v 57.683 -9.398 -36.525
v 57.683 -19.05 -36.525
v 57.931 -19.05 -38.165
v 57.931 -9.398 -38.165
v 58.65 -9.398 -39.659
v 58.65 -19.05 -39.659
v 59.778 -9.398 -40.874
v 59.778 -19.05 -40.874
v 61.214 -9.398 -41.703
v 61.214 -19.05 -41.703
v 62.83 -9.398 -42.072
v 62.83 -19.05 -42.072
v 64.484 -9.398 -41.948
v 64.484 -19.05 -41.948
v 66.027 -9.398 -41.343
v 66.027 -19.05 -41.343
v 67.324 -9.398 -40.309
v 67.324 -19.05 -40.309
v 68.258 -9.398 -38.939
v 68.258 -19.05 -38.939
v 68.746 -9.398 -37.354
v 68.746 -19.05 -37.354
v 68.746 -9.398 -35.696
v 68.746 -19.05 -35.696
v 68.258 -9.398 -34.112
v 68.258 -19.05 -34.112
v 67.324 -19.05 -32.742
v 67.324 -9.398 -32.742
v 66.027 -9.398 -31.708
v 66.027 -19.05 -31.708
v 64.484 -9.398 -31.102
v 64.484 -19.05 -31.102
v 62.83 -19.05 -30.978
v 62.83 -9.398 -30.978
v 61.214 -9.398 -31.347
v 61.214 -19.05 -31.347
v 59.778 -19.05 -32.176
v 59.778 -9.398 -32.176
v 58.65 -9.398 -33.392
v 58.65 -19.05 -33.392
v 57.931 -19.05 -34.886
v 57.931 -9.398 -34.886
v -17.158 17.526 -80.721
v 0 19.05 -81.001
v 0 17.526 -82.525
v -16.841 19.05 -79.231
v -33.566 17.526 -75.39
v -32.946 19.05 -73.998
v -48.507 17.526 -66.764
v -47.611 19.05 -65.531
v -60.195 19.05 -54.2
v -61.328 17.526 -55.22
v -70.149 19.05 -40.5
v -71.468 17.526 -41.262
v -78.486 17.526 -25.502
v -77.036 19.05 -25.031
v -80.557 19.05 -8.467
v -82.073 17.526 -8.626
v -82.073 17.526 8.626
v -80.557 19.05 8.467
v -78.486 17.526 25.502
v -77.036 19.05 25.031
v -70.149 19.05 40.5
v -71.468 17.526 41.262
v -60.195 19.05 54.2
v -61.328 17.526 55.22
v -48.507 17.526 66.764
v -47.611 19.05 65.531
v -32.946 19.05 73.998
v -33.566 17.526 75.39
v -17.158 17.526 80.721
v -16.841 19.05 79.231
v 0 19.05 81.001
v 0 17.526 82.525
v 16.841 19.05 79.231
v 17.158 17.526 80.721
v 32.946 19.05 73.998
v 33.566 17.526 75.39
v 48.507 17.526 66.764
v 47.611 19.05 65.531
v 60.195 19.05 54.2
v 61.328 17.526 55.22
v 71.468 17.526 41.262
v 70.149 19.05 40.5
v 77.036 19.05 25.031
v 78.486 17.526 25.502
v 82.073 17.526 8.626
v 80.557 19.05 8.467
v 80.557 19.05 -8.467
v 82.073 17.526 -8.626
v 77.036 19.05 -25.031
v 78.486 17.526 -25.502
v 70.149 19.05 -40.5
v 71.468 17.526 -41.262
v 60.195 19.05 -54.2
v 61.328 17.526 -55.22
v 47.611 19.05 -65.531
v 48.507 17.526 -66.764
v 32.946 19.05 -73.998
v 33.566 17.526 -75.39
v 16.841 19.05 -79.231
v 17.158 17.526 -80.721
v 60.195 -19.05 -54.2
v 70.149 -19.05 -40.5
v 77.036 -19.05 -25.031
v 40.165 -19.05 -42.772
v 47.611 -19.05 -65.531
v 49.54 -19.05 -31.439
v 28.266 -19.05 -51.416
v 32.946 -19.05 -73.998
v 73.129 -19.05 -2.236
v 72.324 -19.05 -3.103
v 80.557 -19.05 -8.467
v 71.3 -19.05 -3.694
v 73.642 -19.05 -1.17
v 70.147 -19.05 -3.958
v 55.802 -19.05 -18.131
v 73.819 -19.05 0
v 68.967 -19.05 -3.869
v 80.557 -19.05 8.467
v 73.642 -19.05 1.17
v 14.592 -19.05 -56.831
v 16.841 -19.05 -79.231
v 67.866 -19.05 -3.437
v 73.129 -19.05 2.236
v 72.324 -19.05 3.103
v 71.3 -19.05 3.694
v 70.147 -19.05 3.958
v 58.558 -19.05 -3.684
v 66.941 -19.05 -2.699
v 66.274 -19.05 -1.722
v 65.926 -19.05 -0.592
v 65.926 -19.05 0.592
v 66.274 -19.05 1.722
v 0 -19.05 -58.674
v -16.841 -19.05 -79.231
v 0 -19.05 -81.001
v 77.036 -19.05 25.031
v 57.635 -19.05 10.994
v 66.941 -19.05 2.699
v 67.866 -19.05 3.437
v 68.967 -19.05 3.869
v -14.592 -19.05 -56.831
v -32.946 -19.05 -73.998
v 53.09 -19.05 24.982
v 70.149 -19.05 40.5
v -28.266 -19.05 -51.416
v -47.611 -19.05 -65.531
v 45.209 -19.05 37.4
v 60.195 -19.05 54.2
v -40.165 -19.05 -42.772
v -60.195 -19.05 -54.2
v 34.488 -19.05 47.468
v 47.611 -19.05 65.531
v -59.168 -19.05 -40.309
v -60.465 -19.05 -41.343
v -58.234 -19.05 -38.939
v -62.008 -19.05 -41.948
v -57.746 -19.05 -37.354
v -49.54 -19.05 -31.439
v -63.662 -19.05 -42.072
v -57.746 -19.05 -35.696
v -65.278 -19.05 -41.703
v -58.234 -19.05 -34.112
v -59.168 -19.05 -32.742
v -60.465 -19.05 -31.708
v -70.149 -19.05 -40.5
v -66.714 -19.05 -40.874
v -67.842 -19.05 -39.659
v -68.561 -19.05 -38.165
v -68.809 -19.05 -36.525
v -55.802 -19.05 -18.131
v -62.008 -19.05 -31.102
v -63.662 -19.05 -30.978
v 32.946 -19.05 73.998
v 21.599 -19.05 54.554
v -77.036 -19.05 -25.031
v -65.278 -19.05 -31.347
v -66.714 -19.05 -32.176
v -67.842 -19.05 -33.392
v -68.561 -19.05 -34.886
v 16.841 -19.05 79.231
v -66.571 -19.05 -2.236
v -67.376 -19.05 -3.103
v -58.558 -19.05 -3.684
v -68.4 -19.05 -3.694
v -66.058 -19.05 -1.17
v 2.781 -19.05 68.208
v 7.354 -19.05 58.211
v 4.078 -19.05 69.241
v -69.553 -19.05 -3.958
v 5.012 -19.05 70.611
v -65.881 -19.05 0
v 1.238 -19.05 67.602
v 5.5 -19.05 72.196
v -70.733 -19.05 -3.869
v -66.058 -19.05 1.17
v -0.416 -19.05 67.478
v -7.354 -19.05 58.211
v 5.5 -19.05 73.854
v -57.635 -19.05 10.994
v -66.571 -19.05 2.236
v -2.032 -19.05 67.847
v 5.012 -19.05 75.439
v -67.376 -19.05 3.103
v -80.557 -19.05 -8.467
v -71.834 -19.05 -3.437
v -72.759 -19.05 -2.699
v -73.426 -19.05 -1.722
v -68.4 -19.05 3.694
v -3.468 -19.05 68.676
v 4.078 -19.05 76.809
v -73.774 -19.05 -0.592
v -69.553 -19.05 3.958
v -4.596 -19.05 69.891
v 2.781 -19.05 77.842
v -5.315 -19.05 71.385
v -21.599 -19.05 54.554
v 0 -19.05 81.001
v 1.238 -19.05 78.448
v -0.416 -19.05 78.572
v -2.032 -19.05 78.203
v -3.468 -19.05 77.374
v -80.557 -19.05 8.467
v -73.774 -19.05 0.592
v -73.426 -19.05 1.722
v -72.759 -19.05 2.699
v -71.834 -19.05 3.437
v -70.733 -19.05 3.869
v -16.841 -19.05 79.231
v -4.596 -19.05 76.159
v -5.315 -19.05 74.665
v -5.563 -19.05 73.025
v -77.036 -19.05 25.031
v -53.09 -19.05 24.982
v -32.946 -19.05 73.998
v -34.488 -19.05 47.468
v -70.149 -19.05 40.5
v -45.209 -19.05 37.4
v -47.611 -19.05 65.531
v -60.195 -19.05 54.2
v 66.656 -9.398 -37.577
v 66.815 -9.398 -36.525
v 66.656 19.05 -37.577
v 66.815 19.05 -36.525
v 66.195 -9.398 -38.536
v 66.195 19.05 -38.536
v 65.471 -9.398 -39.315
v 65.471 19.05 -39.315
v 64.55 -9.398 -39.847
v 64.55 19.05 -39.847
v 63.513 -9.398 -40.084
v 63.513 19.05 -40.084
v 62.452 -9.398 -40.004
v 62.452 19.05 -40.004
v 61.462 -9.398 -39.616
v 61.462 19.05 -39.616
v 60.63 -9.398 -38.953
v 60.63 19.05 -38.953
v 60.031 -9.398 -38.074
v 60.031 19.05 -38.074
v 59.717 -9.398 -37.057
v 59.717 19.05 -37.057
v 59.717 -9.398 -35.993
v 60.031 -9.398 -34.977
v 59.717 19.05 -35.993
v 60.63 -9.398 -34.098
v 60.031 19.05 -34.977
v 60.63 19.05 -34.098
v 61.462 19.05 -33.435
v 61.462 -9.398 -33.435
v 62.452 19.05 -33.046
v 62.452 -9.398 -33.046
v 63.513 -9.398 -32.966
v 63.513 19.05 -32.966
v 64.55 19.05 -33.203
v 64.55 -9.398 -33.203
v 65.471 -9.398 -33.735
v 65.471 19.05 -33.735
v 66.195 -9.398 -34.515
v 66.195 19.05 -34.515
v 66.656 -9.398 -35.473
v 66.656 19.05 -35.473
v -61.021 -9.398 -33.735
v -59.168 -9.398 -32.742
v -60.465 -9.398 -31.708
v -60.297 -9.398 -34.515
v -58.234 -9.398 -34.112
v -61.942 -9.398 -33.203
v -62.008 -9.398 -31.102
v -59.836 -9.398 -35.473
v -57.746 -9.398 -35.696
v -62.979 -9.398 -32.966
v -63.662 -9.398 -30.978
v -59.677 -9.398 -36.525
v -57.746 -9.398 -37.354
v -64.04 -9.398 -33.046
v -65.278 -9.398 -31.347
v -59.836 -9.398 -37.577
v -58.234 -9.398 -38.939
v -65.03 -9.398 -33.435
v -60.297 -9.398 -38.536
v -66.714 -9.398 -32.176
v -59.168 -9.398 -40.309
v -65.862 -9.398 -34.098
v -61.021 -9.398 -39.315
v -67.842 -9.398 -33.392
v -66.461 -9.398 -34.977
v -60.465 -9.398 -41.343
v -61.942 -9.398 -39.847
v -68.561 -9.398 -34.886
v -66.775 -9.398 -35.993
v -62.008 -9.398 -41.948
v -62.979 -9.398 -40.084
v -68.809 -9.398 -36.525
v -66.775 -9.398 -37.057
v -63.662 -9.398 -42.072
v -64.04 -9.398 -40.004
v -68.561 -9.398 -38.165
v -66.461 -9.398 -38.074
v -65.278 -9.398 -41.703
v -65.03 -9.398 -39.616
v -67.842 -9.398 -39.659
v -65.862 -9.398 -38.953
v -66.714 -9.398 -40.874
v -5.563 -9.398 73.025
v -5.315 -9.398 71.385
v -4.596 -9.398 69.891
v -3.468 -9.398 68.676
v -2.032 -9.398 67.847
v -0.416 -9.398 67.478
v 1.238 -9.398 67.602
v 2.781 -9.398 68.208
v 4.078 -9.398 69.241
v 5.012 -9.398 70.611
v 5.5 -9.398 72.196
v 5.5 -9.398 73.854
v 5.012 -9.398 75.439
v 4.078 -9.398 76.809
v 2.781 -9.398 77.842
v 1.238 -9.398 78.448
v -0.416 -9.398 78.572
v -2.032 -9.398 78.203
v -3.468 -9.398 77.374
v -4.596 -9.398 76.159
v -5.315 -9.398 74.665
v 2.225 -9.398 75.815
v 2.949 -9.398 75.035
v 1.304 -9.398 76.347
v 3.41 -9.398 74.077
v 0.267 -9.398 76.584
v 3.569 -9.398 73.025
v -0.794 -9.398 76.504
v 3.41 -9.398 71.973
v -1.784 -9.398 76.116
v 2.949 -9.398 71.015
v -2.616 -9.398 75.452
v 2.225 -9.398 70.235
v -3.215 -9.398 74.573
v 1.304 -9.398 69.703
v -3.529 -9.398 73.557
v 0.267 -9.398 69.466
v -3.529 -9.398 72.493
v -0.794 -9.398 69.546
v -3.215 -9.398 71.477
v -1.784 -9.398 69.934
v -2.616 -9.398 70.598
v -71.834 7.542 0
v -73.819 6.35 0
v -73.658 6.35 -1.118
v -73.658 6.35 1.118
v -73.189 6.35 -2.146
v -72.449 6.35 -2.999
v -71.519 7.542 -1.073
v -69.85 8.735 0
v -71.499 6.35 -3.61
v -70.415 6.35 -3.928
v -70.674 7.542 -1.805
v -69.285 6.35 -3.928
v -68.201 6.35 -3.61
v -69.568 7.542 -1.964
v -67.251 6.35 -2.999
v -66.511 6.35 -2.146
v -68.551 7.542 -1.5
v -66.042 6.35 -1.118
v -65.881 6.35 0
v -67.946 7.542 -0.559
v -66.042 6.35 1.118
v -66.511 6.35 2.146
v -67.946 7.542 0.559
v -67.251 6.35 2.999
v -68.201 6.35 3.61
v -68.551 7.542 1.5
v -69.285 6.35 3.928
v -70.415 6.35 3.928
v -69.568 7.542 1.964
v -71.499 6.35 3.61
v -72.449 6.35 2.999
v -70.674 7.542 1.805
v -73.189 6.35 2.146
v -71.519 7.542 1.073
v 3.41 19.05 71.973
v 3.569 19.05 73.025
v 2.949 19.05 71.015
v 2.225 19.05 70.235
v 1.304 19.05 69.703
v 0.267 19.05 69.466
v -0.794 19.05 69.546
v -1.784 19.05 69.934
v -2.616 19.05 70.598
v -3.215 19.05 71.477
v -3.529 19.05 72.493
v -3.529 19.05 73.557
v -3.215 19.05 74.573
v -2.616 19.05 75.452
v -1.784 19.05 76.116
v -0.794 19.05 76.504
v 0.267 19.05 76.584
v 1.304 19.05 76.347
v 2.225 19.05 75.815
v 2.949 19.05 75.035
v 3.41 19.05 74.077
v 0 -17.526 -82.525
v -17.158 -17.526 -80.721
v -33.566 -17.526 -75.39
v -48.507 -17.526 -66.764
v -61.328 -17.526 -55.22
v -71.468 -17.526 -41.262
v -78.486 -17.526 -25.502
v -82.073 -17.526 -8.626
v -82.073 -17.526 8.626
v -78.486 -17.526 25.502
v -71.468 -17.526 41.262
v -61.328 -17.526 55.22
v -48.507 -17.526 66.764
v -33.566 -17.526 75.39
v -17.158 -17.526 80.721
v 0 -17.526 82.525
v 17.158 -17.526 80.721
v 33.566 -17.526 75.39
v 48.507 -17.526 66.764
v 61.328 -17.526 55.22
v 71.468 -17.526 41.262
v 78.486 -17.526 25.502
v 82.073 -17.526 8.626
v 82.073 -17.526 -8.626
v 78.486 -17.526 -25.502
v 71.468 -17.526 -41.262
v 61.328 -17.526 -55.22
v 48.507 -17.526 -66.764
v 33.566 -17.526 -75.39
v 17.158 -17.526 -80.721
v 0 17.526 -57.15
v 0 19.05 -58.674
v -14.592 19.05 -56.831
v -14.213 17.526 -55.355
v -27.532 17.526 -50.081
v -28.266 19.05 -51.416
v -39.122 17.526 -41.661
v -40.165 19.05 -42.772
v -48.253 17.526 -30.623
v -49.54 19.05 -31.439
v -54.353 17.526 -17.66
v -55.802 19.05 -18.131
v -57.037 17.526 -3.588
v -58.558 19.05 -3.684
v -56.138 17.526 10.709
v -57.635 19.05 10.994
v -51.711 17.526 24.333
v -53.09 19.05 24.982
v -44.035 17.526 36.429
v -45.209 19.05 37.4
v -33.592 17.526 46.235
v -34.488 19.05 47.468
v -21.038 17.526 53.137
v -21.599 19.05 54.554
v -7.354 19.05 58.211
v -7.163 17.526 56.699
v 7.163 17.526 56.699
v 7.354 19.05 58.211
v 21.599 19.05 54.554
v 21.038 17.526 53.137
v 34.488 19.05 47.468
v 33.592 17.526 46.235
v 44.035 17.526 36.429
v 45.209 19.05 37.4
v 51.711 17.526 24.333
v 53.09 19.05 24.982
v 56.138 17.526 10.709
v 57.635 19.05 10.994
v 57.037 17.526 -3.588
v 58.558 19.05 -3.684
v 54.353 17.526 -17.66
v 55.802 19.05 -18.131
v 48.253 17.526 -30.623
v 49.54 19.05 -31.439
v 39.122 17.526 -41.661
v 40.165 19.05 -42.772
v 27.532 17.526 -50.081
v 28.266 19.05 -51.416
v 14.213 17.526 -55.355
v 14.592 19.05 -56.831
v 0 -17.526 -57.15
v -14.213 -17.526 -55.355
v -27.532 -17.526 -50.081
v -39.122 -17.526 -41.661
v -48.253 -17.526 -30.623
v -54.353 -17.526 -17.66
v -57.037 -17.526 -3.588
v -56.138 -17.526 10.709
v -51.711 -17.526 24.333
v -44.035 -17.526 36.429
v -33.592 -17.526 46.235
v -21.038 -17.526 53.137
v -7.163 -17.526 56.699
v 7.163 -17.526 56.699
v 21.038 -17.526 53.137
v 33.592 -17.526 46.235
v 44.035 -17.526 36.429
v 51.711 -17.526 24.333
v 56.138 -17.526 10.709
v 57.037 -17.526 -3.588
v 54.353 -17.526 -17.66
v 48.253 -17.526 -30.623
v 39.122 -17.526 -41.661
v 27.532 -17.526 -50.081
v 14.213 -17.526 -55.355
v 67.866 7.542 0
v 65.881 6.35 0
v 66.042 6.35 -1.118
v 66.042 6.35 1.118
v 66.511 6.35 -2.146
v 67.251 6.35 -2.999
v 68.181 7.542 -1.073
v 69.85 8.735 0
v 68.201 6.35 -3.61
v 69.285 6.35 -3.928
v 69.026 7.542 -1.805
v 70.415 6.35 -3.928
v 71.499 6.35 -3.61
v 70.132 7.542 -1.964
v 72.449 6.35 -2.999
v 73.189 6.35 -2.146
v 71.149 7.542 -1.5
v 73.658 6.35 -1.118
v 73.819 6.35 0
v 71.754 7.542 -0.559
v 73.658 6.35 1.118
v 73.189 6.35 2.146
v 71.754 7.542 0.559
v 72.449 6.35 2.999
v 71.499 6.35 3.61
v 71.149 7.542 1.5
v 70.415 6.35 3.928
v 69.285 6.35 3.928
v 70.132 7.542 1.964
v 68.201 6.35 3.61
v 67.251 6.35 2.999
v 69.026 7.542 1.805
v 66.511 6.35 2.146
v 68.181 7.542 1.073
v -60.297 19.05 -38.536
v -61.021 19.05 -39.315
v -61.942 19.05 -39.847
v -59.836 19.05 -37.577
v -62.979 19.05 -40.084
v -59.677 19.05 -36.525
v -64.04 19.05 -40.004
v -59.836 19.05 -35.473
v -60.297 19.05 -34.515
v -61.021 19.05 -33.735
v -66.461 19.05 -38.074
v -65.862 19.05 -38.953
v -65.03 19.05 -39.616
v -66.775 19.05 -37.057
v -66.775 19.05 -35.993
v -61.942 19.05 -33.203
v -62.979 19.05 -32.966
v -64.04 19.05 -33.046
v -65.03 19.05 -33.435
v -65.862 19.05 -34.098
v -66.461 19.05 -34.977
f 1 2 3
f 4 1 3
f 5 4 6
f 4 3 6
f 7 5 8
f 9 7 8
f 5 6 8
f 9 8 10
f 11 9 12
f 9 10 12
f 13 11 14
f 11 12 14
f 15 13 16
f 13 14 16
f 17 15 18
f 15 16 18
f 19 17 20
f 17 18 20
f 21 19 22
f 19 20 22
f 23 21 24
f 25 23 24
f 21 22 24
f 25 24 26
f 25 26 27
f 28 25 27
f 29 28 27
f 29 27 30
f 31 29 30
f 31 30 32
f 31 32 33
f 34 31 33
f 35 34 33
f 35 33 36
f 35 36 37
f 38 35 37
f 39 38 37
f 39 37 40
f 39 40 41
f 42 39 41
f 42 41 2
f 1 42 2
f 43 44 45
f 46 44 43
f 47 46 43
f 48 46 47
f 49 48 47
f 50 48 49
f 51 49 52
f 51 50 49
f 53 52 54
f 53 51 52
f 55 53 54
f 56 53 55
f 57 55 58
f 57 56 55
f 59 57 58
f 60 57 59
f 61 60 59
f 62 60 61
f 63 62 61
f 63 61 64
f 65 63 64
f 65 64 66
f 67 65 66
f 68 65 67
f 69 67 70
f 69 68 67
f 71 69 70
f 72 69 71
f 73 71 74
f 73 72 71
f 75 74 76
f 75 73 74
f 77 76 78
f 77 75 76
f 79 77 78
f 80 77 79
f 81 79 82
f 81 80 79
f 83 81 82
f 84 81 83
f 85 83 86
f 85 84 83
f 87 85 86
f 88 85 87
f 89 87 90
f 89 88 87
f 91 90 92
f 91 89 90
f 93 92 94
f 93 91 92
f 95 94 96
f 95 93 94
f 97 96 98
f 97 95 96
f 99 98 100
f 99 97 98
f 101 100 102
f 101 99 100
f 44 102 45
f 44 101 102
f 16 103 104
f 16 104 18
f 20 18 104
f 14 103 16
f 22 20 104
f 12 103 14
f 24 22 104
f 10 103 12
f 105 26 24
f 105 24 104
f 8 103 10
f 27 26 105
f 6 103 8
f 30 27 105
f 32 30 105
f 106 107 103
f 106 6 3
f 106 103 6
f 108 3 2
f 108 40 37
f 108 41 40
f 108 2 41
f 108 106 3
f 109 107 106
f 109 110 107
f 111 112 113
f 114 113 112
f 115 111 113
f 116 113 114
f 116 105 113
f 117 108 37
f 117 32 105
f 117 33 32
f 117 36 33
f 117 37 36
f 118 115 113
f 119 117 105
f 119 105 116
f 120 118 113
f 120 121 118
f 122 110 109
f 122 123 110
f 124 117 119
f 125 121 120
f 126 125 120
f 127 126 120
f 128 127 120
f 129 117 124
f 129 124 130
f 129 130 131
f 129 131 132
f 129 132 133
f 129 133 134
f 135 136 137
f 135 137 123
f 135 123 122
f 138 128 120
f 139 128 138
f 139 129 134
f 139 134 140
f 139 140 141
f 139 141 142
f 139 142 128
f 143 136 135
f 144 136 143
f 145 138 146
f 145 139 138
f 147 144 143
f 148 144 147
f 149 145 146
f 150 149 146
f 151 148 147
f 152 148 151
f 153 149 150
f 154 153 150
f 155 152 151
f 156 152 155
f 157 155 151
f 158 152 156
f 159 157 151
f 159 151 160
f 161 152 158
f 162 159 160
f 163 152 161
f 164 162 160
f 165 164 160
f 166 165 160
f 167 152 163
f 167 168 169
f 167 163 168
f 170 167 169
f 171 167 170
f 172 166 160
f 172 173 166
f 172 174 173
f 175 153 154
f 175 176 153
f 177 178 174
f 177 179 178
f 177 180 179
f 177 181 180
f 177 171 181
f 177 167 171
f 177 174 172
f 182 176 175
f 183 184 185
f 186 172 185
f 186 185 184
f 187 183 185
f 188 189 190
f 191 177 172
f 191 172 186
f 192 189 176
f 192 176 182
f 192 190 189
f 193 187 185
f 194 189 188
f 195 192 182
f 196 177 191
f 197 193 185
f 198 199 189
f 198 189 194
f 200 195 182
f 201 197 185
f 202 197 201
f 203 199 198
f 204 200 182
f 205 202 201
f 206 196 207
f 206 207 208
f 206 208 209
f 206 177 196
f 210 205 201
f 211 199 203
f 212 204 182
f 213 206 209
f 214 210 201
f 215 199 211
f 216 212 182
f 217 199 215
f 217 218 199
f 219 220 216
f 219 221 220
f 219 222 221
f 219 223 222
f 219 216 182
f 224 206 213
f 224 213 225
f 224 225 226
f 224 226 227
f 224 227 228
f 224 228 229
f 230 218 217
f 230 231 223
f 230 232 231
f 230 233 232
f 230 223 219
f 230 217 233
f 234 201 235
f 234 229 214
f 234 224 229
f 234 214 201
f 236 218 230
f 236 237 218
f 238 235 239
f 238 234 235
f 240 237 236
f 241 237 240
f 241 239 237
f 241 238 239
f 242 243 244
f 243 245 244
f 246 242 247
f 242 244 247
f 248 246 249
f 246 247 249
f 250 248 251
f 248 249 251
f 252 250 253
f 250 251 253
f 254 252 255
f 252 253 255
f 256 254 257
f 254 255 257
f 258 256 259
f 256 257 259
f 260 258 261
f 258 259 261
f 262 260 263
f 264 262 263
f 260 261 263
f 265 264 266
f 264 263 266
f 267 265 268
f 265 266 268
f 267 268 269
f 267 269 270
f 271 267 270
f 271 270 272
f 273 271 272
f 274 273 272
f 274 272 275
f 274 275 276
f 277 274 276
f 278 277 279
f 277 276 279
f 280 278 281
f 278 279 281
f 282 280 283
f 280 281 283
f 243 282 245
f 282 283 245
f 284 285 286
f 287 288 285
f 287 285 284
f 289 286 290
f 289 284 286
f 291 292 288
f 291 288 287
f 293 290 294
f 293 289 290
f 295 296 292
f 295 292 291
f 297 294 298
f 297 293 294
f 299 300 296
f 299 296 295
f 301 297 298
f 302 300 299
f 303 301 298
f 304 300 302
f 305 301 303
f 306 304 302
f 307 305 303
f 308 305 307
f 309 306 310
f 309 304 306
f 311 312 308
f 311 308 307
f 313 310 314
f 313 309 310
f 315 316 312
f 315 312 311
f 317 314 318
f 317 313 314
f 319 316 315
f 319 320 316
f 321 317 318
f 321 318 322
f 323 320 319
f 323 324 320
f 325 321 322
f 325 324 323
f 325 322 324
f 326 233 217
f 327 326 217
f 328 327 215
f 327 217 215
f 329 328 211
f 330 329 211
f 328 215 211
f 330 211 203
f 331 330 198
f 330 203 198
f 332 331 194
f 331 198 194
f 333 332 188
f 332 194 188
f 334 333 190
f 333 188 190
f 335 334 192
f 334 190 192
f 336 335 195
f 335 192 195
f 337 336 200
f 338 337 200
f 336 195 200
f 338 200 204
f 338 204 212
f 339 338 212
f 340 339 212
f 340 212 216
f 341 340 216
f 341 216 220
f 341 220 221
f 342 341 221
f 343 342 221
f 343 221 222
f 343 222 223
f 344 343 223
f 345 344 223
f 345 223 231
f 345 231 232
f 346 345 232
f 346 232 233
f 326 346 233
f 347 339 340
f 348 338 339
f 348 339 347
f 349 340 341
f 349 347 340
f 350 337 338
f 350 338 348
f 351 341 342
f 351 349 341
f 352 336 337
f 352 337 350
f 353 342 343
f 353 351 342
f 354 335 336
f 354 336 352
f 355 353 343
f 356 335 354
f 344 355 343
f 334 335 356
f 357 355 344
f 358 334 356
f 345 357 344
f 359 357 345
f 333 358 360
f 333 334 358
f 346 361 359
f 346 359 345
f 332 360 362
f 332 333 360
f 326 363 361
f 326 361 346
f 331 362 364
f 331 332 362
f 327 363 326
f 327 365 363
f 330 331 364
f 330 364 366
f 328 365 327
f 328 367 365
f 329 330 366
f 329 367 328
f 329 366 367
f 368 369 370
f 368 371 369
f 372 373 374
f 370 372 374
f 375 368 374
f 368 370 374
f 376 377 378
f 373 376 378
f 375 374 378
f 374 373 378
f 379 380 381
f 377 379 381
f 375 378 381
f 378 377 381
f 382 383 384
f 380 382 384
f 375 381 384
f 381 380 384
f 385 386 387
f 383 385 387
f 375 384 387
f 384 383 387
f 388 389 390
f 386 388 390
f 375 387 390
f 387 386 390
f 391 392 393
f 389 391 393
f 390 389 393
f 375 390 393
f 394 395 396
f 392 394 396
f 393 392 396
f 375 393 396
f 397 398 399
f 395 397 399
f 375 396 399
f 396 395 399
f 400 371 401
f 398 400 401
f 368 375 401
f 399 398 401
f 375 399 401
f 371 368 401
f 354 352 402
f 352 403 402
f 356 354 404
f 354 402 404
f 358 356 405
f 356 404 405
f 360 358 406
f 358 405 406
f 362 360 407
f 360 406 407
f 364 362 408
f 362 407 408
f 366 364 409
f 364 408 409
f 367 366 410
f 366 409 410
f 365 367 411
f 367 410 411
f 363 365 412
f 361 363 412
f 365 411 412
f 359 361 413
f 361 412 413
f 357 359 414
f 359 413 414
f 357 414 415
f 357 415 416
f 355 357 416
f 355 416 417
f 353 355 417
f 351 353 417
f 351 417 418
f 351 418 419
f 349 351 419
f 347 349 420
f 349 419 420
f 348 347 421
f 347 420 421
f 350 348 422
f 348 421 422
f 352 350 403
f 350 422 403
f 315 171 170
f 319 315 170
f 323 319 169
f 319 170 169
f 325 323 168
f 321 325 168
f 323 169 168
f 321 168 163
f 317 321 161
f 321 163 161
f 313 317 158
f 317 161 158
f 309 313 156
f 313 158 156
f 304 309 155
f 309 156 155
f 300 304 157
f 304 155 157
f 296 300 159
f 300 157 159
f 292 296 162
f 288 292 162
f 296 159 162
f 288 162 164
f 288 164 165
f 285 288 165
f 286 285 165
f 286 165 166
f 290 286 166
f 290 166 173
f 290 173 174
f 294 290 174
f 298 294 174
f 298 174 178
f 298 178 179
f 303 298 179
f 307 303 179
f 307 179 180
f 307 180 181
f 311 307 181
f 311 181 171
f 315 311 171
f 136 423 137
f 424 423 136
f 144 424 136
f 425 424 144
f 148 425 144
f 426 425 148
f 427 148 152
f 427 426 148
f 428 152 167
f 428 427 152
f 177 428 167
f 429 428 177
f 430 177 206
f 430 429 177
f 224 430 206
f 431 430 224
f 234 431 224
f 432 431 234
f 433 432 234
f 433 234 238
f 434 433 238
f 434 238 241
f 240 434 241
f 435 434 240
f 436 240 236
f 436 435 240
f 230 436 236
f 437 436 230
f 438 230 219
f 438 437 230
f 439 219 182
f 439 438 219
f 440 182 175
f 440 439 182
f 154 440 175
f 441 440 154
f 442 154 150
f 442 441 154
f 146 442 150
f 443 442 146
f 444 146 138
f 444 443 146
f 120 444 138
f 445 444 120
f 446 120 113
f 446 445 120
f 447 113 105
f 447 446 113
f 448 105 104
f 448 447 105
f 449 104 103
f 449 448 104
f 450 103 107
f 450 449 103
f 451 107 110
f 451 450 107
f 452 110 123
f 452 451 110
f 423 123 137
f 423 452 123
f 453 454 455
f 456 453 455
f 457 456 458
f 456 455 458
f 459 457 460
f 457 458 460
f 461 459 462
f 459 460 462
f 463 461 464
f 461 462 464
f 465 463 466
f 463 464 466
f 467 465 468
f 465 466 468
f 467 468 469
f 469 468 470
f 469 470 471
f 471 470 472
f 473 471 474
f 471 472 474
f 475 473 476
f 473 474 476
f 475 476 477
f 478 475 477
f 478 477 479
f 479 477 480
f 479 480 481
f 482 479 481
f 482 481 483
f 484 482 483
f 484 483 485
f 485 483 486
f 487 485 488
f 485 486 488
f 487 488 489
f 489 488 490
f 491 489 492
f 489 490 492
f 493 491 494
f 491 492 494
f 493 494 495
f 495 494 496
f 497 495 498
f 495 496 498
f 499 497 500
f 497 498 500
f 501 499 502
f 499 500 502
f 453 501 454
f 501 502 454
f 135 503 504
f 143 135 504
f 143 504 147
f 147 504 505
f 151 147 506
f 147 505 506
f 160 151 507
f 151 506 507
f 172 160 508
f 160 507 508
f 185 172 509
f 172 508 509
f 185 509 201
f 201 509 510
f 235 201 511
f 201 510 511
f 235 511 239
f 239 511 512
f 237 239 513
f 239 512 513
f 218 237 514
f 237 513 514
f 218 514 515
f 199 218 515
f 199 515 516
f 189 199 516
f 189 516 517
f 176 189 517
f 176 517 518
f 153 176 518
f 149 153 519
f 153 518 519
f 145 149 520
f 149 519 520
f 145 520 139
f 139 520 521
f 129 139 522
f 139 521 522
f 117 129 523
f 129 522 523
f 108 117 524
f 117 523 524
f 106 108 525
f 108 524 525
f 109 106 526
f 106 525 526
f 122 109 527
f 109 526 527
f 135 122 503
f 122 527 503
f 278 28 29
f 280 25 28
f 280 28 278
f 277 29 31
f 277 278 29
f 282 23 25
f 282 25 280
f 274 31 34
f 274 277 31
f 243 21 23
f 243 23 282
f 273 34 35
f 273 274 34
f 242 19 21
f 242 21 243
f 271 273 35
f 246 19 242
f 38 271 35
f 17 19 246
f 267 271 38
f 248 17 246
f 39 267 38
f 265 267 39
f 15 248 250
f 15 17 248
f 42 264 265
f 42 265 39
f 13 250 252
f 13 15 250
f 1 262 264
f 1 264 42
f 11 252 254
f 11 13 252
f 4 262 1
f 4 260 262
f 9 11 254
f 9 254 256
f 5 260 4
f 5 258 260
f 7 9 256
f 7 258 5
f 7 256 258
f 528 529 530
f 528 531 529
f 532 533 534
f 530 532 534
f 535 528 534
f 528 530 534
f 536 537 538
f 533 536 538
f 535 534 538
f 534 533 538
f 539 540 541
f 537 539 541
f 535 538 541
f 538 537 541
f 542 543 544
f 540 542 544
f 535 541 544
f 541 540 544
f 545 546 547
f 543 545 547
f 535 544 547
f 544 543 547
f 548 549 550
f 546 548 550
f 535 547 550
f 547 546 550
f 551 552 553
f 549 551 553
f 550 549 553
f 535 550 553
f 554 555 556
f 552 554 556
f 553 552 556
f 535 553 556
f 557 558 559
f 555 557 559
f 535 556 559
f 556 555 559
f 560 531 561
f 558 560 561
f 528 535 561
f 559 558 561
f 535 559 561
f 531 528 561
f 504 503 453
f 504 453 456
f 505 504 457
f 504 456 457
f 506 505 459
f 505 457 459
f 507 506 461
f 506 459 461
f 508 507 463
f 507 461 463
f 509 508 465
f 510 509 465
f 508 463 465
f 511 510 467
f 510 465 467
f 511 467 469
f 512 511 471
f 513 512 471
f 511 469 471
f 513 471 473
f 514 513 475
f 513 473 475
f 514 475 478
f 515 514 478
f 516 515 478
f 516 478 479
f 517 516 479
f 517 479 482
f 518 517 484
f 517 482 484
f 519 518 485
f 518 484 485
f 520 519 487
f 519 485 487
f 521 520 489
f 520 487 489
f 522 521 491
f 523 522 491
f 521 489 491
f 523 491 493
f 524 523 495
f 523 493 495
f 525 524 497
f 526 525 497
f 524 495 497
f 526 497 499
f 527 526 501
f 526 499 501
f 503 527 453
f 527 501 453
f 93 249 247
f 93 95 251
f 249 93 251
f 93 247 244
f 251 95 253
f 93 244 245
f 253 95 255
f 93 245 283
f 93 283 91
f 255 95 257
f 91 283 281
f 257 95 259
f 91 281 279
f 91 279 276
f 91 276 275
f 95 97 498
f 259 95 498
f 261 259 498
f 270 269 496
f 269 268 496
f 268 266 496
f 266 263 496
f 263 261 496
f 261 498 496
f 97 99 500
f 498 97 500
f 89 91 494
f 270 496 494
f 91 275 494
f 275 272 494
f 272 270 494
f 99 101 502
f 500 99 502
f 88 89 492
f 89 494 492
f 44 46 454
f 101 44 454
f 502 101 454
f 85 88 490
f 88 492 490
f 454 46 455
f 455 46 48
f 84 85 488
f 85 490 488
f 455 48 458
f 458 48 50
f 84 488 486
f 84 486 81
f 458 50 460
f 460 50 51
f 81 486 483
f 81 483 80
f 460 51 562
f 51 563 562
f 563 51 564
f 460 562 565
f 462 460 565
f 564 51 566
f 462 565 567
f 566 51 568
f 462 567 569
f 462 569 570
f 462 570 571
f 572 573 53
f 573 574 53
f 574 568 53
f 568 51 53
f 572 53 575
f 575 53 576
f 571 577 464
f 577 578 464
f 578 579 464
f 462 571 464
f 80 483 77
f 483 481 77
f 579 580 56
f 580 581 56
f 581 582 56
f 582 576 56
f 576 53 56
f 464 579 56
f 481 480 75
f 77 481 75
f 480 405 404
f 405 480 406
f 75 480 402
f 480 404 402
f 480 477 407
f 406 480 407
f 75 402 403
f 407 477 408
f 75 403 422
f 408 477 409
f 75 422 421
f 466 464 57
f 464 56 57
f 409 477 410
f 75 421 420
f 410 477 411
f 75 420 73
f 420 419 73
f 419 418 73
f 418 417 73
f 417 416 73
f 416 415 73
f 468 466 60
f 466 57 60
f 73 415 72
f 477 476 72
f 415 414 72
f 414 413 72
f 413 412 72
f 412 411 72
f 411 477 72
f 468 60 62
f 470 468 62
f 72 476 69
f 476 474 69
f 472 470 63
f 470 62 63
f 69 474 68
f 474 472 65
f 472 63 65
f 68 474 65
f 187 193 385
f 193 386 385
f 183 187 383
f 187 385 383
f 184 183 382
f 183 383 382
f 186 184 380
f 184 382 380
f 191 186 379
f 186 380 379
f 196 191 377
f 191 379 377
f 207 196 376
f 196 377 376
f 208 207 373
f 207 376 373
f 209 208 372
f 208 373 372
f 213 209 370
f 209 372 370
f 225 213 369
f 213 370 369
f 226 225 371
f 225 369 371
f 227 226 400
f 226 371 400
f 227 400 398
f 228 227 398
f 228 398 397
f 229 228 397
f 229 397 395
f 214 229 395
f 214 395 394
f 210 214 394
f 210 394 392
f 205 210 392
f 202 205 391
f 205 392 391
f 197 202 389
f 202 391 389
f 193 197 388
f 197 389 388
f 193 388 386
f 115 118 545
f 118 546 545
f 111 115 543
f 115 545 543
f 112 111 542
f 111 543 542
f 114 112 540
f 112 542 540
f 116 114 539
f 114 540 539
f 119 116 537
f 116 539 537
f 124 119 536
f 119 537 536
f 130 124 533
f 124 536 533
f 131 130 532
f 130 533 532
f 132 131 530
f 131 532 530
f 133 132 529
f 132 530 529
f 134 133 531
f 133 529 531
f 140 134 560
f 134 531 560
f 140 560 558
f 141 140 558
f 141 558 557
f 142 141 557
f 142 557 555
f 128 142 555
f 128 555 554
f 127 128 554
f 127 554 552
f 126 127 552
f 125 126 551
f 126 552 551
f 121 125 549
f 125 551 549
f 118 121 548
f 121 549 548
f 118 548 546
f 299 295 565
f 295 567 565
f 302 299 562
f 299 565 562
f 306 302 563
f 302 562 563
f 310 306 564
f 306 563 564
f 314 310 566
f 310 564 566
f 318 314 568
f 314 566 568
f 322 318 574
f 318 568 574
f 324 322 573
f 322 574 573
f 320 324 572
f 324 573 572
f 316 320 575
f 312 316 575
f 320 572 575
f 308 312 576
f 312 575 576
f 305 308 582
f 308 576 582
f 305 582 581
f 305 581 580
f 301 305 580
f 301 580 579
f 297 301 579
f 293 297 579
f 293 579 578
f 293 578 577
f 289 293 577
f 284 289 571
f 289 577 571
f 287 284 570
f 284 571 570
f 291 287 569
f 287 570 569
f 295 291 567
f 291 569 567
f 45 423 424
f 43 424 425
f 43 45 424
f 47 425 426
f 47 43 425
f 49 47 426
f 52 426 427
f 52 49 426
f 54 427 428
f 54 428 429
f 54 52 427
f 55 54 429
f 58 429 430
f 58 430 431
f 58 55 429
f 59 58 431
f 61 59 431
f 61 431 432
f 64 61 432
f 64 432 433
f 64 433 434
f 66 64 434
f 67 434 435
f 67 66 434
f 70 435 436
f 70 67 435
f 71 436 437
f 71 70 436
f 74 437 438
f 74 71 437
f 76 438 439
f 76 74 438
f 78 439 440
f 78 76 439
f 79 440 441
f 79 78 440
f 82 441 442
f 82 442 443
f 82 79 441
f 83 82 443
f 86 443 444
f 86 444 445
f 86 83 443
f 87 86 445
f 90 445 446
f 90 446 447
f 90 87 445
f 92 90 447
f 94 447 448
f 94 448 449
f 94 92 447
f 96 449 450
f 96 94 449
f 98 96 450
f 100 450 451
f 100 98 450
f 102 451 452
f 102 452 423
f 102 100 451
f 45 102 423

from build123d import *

# Parameters (mm, degrees)
SKETCH1_W                                        = 38.1
SKETCH1_H                                        = 25.3746
CBORE_FOR_1_4_SOCKET_HEAD_CAP_SCREW1_D           = 7.1374
CBORE_FOR_1_4_SOCKET_HEAD_CAP_SCREW1_DEPTH       = 38.1
CBORE_FOR_1_4_SOCKET_HEAD_CAP_SCREW1_CBORE_D     = 11.1252
CBORE_FOR_1_4_SOCKET_HEAD_CAP_SCREW1_CBORE_DEPTH = 9.652
CBORE_FOR_1_4_SOCKET_HEAD_CAP_SCREW1_TIP         = 2.144291291
F_3_8_16_TAPPED_HOLE2_D                          = 7.9375
F_3_8_16_TAPPED_HOLE2_DEPTH                      = 25.4
F_3_8_16_TAPPED_HOLE2_TIP                        = 2.384665582
CHAMFER1_SIZE                                    = 1.524


with BuildPart() as part:
    # Sketch1 → Revolve1 (revolve)
    with BuildSketch(Plane(origin=(0, 0, 0), x_dir=(0, 1, 0), z_dir=(0, 0, 1)), mode=Mode.PRIVATE) as revolve1_sk:
        with Locations((0, 69.8373)):
            Rectangle(SKETCH1_W, SKETCH1_H)
    revolve(revolve1_sk.sketch.rotate(Axis((0, -44.45, 0), (0, 1, 0)), 270), axis=Axis((0, -44.45, 0), (0, 1, 0)))

    # CBORE for 1/4 Socket Head Cap Screw1
    with Locations(Plane(origin=(0, -19.05, 0), x_dir=(-1, 0, 0), z_dir=(0, -1, 0))):
        with Locations((0, -73.025), (-63.246, 36.5252), (63.246, 36.5252)):
            CounterBoreHole(CBORE_FOR_1_4_SOCKET_HEAD_CAP_SCREW1_D / 2, CBORE_FOR_1_4_SOCKET_HEAD_CAP_SCREW1_CBORE_D / 2, CBORE_FOR_1_4_SOCKET_HEAD_CAP_SCREW1_CBORE_DEPTH, depth=CBORE_FOR_1_4_SOCKET_HEAD_CAP_SCREW1_DEPTH)
            with Locations((0, 0, -(CBORE_FOR_1_4_SOCKET_HEAD_CAP_SCREW1_DEPTH + CBORE_FOR_1_4_SOCKET_HEAD_CAP_SCREW1_TIP / 2))):  # 118° drill point
                Cone(0, CBORE_FOR_1_4_SOCKET_HEAD_CAP_SCREW1_D / 2, CBORE_FOR_1_4_SOCKET_HEAD_CAP_SCREW1_TIP, mode=Mode.SUBTRACT)

    # 3/8-16 Tapped Hole2
    with Locations(Plane(origin=(0, -19.05, 0), x_dir=(-1, 0, 0), z_dir=(0, -1, 0))):
        with Locations((-69.85, 0), (69.85, 0)):
            Hole(F_3_8_16_TAPPED_HOLE2_D / 2, depth=F_3_8_16_TAPPED_HOLE2_DEPTH)
            with Locations((0, 0, -(F_3_8_16_TAPPED_HOLE2_DEPTH + F_3_8_16_TAPPED_HOLE2_TIP / 2))):  # 118° drill point
                Cone(0, F_3_8_16_TAPPED_HOLE2_D / 2, F_3_8_16_TAPPED_HOLE2_TIP, mode=Mode.SUBTRACT)

    # Chamfer1
    chamfer1_edges = [part.edges().sort_by_distance(p)[0] for p in [
        (0, -19.05, 57.15),
        (0, 19.05, 57.15),
        (0, 19.05, 82.5246),
        (0, -19.05, 82.5246),
    ]]
    chamfer(chamfer1_edges, length=CHAMFER1_SIZE)


solid = part.part
